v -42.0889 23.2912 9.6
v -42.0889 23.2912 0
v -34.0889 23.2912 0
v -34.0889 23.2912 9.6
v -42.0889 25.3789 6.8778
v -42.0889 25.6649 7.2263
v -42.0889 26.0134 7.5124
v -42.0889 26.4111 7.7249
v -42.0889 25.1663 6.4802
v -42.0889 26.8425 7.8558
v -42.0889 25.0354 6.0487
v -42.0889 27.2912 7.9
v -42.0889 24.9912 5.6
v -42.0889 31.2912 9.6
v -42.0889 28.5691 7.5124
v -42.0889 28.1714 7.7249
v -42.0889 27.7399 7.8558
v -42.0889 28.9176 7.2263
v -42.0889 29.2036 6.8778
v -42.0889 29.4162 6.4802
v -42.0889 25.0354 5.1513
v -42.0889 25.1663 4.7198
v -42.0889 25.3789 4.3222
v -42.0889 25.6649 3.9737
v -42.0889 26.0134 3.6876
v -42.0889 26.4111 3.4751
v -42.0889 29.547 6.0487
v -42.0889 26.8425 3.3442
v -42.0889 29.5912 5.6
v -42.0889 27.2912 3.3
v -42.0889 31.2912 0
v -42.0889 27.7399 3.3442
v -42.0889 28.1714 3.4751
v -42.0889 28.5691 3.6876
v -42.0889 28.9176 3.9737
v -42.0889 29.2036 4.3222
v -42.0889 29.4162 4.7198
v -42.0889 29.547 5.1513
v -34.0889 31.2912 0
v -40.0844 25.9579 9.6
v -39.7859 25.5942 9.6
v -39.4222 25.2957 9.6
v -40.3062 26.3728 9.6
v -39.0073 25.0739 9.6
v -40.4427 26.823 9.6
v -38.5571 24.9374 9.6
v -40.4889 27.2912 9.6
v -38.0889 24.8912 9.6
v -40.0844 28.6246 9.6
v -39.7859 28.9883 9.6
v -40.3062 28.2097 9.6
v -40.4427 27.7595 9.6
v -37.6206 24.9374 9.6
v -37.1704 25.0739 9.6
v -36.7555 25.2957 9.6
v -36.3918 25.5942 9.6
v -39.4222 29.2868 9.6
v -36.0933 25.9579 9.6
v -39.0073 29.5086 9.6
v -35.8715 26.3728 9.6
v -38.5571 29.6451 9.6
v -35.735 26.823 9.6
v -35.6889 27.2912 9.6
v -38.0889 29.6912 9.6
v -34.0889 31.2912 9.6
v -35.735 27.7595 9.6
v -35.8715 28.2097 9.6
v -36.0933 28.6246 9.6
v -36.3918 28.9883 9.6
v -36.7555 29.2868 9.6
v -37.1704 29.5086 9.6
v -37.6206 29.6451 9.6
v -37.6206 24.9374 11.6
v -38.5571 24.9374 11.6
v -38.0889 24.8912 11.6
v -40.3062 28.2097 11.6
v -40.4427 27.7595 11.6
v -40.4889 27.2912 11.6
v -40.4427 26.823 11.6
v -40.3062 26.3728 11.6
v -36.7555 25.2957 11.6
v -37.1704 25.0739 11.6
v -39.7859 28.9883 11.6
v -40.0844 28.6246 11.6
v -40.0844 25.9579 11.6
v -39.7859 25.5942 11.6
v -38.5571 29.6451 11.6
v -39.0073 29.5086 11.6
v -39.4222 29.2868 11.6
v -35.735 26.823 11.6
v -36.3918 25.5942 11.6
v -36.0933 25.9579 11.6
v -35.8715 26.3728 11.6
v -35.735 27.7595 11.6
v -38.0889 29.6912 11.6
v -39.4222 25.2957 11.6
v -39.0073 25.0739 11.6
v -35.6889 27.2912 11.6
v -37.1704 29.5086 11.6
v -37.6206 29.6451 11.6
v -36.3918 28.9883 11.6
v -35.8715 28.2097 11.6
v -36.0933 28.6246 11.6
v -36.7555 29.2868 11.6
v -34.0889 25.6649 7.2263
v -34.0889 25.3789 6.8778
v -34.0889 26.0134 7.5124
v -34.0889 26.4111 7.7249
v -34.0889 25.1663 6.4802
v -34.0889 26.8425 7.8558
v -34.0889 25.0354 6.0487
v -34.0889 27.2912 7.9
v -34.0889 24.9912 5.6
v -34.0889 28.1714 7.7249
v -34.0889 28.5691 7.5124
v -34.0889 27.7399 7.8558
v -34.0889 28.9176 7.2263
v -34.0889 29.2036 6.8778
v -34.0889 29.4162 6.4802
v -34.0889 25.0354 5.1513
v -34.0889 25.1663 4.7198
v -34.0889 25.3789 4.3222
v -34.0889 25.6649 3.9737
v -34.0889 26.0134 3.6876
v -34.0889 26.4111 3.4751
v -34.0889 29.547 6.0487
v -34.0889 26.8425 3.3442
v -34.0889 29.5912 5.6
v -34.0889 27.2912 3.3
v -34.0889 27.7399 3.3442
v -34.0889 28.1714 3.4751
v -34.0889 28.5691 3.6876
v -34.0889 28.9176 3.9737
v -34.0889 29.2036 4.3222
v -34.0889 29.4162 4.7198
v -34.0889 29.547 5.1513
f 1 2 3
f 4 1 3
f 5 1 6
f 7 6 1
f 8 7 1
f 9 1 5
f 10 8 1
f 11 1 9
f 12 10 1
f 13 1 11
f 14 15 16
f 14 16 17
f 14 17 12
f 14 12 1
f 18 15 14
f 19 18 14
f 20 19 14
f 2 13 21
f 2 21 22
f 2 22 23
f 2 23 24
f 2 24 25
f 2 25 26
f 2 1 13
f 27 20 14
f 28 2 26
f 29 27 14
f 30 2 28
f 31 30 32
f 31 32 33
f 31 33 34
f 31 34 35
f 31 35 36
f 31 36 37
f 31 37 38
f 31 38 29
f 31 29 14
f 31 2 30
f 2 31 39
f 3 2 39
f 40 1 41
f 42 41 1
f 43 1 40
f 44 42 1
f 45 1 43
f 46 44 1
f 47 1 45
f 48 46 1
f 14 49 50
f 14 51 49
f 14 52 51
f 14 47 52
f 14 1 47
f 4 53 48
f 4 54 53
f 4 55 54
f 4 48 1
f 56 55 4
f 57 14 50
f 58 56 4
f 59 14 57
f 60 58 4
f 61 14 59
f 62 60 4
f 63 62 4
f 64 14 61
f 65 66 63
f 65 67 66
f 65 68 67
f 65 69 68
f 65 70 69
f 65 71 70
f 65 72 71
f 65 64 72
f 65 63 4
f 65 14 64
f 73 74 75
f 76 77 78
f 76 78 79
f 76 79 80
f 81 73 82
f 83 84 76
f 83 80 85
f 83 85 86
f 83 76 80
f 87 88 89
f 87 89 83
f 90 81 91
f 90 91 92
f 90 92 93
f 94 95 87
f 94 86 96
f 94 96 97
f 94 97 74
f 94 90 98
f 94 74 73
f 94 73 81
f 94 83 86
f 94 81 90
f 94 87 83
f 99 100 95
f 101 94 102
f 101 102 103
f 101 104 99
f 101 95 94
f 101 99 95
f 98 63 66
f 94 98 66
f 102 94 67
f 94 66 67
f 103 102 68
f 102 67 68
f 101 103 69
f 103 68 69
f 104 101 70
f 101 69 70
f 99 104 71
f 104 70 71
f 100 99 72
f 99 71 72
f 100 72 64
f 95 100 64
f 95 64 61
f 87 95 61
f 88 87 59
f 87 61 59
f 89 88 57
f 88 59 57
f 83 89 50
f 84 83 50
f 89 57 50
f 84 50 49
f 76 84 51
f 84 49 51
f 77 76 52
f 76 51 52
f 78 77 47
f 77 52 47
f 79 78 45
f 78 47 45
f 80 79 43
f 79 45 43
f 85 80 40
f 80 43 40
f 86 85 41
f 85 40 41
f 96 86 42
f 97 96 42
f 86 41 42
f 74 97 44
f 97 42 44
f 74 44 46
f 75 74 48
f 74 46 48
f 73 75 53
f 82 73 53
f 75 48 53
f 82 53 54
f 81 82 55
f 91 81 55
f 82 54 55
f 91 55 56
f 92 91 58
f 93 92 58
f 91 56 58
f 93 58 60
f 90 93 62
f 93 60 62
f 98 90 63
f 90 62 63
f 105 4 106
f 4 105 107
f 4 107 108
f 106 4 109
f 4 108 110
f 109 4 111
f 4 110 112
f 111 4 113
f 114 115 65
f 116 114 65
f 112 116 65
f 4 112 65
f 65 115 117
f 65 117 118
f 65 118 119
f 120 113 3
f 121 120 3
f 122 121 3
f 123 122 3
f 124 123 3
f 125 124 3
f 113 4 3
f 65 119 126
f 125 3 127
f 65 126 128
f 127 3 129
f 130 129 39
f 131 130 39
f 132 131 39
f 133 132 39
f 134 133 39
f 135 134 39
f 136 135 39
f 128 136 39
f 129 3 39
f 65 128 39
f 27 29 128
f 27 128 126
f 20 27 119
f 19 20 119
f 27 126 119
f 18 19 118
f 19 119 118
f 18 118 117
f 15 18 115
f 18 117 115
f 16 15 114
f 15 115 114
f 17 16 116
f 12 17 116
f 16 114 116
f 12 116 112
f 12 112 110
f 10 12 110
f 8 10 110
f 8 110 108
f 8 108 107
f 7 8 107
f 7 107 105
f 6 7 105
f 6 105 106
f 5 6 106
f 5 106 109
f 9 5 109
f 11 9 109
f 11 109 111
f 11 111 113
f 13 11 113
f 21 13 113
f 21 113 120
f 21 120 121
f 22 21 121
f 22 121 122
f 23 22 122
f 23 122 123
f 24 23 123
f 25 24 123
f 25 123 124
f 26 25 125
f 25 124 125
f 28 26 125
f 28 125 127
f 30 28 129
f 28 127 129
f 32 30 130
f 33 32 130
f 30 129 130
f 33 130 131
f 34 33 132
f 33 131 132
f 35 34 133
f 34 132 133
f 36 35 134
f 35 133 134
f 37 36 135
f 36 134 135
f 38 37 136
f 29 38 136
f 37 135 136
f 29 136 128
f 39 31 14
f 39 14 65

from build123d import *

# Parameters (mm, degrees)
F0_W     = 8
F0_H     = 8
F1_DEPTH = 9.6
F2_R     = 2.3
F3_DEPTH = 25
F4_R     = 2.4
F5_DEPTH = 2


with BuildPart() as f1:
    # F0 (on Top) → F1 (new body)
    with BuildSketch(Plane.XY):
        with Locations((-38.088854, 27.291242)):
            Rectangle(F0_W, F0_H)
    extrude(amount=F1_DEPTH)

    # F2 (on face) → F3 (cut)
    with BuildSketch(Plane.YZ.offset(-34.088854)):
        with Locations((27.291242, 5.6)):
            Circle(F2_R)
    extrude(amount=-F3_DEPTH, mode=Mode.SUBTRACT)

    # F4 (on face) → F5 (join)
    with BuildSketch(Plane.XY.offset(9.6)):
        with Locations((-38.088854, 27.291242)):
            Circle(F4_R)
    extrude(amount=F5_DEPTH)


solid = f1.part
